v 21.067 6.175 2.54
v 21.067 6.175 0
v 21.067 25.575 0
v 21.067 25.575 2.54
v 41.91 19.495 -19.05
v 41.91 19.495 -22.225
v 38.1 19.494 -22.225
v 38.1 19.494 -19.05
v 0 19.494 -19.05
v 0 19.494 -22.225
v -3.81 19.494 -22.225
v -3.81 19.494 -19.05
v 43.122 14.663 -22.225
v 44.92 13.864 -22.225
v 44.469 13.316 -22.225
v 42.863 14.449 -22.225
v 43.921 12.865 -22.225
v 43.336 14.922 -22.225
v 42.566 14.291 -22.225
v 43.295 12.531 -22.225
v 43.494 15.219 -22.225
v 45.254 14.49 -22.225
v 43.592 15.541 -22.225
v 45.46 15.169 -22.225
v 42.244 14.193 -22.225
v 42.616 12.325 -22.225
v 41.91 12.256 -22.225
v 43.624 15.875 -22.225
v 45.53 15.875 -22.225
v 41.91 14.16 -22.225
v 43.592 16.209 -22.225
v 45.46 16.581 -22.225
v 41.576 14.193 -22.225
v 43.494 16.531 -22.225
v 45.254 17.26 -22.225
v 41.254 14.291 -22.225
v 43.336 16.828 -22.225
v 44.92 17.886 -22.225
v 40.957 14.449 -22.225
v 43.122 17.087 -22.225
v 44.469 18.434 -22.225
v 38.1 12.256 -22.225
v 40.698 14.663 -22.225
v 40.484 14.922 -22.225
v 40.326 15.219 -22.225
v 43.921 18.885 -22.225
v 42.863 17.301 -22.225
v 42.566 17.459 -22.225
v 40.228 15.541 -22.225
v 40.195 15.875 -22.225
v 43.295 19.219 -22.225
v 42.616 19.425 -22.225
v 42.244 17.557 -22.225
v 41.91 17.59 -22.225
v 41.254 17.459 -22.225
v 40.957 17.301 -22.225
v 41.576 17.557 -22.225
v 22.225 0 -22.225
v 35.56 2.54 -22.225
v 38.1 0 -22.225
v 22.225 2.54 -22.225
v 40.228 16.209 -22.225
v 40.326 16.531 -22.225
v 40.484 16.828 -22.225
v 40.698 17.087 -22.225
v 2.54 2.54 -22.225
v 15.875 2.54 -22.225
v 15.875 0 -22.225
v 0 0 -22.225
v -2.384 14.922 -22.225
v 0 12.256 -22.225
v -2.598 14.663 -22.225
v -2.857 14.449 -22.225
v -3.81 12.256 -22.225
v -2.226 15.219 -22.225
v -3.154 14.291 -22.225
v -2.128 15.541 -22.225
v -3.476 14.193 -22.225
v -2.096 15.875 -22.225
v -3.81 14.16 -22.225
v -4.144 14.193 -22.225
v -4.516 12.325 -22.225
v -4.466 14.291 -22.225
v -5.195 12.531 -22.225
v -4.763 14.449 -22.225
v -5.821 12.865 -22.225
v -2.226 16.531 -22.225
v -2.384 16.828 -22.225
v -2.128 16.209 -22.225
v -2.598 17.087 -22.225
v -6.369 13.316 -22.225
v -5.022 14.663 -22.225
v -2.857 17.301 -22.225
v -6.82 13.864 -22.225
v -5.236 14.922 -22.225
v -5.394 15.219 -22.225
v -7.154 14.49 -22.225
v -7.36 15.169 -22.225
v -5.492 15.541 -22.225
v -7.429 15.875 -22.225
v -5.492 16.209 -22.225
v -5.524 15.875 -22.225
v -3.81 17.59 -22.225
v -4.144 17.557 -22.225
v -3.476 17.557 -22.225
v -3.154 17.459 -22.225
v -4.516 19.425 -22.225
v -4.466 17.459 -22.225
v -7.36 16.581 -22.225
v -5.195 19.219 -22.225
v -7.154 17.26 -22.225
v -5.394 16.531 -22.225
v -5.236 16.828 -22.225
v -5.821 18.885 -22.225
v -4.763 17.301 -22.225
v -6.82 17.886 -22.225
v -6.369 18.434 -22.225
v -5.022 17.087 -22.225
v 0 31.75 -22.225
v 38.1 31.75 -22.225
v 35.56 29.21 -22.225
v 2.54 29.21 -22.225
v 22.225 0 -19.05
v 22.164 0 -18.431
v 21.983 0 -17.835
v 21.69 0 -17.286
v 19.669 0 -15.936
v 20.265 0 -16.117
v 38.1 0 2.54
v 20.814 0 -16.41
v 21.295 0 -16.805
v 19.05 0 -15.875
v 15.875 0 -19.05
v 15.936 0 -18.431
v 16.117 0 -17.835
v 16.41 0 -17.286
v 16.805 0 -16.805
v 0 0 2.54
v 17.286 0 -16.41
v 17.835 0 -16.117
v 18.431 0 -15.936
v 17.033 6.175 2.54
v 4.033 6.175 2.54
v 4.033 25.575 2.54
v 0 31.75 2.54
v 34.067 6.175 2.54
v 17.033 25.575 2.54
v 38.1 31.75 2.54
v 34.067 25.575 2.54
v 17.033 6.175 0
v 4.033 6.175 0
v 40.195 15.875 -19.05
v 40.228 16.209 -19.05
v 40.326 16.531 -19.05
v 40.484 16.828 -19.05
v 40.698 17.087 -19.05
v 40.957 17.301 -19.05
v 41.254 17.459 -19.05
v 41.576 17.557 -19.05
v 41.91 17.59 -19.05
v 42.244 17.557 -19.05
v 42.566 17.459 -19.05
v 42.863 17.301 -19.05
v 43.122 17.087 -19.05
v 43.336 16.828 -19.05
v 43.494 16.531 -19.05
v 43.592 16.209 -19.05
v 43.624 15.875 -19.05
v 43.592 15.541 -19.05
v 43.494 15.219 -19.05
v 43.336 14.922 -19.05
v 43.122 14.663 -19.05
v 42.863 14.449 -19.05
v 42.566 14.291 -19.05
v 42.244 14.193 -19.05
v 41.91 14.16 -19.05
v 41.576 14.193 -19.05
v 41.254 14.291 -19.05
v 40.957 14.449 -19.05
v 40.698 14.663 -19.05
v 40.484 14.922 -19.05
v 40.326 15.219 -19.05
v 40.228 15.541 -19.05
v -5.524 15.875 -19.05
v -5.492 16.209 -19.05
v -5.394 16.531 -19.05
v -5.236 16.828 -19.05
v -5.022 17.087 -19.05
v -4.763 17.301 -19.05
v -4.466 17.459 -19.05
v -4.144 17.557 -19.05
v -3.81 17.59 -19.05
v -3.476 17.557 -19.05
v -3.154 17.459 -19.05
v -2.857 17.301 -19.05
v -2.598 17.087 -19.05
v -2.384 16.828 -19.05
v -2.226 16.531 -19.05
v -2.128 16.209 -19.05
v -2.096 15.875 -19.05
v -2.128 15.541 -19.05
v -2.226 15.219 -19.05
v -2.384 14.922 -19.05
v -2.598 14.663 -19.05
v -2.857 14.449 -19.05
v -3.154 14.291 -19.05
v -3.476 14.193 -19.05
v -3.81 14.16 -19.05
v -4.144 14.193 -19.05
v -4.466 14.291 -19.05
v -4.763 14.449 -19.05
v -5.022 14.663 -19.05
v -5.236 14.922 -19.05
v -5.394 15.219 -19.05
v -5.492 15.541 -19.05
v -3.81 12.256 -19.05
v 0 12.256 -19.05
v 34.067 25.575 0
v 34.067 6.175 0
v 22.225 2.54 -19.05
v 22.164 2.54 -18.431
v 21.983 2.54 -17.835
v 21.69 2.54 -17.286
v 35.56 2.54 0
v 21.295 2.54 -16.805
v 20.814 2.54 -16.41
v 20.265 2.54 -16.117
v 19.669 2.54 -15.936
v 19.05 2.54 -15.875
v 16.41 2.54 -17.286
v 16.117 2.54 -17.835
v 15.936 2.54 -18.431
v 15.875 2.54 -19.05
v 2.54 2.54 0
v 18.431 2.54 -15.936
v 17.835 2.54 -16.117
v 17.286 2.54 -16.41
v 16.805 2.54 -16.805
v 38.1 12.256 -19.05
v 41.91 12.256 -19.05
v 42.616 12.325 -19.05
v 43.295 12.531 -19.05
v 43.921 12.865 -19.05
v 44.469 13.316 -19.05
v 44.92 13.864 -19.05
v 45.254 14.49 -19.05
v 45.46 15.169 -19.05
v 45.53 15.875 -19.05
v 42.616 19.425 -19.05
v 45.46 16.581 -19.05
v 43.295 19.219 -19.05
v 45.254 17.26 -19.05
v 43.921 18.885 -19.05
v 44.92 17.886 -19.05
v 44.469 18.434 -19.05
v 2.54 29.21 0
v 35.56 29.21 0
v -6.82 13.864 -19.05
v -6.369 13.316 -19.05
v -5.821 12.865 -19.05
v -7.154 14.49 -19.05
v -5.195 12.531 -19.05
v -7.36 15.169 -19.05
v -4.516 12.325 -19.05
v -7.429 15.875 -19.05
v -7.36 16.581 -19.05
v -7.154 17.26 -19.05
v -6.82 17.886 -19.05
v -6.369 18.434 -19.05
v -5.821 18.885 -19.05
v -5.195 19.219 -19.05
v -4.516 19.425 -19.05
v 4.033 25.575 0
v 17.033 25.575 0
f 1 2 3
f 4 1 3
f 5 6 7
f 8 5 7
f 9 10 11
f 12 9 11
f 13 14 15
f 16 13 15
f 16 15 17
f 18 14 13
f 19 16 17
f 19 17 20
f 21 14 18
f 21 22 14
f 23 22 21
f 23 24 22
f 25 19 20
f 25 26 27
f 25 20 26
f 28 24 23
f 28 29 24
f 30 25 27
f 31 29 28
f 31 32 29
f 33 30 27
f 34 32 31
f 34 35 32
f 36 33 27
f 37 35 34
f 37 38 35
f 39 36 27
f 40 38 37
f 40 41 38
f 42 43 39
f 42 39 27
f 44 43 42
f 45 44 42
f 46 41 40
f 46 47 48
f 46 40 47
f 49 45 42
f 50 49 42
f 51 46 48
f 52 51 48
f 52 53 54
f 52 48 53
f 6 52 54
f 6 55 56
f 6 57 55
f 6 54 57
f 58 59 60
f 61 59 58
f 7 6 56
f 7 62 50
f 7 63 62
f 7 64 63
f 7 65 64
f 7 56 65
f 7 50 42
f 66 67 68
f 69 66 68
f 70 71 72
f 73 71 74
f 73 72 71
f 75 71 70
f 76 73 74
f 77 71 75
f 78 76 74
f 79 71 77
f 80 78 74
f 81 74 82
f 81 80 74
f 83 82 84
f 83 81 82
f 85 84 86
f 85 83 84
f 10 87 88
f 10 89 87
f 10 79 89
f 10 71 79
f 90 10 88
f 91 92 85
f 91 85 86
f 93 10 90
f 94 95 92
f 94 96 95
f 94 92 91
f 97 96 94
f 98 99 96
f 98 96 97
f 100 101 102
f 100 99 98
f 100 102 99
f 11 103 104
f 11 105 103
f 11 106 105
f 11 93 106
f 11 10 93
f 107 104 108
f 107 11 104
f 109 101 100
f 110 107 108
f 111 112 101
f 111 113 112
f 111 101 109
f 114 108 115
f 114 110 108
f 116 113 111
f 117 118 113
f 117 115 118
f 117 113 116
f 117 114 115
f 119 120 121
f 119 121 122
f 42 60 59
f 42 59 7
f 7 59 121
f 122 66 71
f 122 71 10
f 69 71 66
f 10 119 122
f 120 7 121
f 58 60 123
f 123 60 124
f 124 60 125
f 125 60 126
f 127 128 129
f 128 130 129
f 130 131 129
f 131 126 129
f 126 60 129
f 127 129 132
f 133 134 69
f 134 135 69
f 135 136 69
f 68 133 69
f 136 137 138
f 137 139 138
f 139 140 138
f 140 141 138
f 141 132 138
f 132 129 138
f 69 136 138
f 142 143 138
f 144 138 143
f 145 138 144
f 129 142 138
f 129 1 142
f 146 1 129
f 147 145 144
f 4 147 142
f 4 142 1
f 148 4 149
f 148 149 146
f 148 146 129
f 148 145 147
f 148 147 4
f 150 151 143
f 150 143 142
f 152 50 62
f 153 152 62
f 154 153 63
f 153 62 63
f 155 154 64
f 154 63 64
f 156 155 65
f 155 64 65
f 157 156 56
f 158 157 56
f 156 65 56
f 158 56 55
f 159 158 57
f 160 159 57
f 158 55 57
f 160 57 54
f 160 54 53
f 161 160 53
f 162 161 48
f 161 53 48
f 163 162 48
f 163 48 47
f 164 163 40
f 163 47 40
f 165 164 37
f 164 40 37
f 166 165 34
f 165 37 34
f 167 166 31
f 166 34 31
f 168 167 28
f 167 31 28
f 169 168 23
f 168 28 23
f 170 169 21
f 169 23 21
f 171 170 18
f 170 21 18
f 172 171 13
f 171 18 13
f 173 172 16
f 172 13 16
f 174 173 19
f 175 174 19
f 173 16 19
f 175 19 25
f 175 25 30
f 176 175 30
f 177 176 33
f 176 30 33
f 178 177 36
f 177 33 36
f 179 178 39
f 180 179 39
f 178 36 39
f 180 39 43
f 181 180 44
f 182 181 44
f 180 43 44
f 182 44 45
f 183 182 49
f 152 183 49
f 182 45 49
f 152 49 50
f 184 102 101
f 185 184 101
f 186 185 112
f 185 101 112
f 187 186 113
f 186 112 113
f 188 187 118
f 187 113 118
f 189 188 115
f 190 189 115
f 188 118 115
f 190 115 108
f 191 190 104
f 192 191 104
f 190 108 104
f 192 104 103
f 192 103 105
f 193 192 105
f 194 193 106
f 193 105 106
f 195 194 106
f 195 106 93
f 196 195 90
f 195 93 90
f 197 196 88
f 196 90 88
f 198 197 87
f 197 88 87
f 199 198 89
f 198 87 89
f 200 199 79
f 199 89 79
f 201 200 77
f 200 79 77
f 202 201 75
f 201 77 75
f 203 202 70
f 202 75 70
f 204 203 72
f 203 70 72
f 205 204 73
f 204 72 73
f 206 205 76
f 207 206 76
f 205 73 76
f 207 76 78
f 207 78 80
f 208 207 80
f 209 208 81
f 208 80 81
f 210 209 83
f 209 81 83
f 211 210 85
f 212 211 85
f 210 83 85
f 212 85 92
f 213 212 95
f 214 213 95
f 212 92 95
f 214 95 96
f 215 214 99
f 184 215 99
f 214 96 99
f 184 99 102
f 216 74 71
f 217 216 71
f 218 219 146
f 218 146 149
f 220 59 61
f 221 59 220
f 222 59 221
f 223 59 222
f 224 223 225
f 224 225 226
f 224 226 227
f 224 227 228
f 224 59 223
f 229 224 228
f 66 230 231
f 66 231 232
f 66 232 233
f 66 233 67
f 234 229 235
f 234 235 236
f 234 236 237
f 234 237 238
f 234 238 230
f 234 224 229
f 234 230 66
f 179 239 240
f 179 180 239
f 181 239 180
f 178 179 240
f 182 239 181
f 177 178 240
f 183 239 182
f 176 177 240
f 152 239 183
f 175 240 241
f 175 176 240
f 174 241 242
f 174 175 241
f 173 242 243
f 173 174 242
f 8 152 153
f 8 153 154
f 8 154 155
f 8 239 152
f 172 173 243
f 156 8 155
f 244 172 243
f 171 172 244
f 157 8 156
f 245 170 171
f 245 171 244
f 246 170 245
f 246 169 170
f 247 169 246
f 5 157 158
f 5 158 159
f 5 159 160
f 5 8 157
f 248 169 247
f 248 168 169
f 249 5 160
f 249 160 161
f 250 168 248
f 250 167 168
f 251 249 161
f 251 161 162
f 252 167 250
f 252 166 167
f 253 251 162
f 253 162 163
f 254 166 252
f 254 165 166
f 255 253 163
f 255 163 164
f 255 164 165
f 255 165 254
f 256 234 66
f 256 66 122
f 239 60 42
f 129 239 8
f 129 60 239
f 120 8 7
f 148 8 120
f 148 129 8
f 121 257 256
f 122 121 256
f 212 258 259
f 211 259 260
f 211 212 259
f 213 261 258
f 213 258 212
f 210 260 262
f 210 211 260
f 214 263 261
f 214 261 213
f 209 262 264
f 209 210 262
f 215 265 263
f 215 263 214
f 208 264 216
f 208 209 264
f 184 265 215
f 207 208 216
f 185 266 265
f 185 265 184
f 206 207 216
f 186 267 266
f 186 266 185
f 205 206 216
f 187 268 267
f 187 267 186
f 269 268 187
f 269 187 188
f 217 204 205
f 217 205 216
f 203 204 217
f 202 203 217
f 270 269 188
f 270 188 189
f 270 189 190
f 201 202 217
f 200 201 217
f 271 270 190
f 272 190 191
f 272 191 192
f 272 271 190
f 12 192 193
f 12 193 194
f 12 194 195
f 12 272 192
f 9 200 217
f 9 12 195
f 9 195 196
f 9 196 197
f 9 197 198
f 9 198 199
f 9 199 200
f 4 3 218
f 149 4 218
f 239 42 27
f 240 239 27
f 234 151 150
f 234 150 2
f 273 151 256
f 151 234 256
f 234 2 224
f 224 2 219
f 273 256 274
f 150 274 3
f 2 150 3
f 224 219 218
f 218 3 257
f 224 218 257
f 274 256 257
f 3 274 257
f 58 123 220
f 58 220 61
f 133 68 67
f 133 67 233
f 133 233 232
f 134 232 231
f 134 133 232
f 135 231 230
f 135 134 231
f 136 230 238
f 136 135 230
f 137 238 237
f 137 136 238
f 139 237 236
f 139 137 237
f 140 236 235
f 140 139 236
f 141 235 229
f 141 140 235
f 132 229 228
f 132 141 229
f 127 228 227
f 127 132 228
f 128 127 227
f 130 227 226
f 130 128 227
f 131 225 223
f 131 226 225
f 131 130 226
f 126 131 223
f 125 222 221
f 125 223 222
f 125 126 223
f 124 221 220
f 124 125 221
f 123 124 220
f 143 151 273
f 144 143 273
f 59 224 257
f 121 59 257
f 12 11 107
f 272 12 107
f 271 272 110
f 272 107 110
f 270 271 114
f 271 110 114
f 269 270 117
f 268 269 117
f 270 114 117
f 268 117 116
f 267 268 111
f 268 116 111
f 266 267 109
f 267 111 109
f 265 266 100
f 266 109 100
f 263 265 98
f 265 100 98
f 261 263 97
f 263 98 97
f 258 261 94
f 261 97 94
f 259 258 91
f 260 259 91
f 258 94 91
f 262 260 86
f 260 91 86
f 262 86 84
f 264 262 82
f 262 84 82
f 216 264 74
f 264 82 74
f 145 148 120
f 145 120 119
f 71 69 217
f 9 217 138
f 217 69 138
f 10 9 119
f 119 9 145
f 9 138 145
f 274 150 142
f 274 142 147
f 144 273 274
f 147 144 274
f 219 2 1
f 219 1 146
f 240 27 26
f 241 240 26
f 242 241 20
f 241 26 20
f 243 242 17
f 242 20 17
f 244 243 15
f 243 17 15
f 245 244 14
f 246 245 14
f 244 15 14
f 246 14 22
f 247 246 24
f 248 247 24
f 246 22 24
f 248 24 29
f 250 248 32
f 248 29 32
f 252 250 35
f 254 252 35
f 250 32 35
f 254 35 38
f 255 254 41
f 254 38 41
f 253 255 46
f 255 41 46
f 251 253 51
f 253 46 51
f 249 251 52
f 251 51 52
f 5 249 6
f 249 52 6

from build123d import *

# Parameters (mm, degrees)
SKETCH1_W           = 38.1
SKETCH1_H           = 31.75
SKETCH1_W_2         = 13
SKETCH1_H_2         = 19.4
BOSS_EXTRUDE1_DEPTH = 2.54
SKETCH2_W           = 38.1
SKETCH2_H           = 31.75
SKETCH2_W_2         = 33.02
SKETCH2_H_2         = 26.67
BOSS_EXTRUDE2_DEPTH = 22.225
SKETCH3_R           = 1.7145
BOSS_EXTRUDE3_DEPTH = 3.175
CUT_EXTRUDE1_REACH  = 61.791


with BuildPart() as part:
    # Sketch1 → Boss-Extrude1 (new body)
    with BuildSketch(Plane.XY):
        with Locations((19.05, 15.875)):
            Rectangle(SKETCH1_W, SKETCH1_H)
        with Locations((10.533333333, 15.875)):
            Rectangle(SKETCH1_W_2, SKETCH1_H_2, mode=Mode.SUBTRACT)
        with Locations((27.566666667, 15.875)):
            Rectangle(SKETCH1_W_2, SKETCH1_H_2, mode=Mode.SUBTRACT)
    extrude(amount=BOSS_EXTRUDE1_DEPTH)

    # Sketch2 → Boss-Extrude2 (add)
    with BuildSketch(Plane(origin=(0, 0, 0), x_dir=(-1, 0, 0), z_dir=(0, 0, -1))):
        with Locations((-19.05, 15.875)):
            Rectangle(SKETCH2_W, SKETCH2_H)
        with Locations((-19.05, 15.875)):
            Rectangle(SKETCH2_W_2, SKETCH2_H_2, mode=Mode.SUBTRACT)
    extrude(amount=BOSS_EXTRUDE2_DEPTH)

    # Sketch3 → Boss-Extrude3 (add)
    # profile 1 of 2: a face of its own
    with BuildSketch(Plane(origin=(0, 0, -22.225), x_dir=(-1, 0, 0), z_dir=(0, 0, -1))):
        with BuildLine():
            Line((-41.91, 19.4945), (-38.1, 19.4945))
            Line((-38.1, 19.4945), (-38.1, 12.2555))
            Line((-38.1, 12.2555), (-41.91, 12.2555))
            ThreePointArc((-41.91, 12.2555), (-45.5295, 15.875), (-41.91, 19.4945))
        make_face()
        with Locations((-41.91, 15.875)):
            Circle(SKETCH3_R, mode=Mode.SUBTRACT)
    # profile 2 of 2: a face of its own
    with BuildSketch(Plane(origin=(0, 0, -22.225), x_dir=(-1, 0, 0), z_dir=(0, 0, -1))):
        with BuildLine():
            Line((3.81, 12.2555), (0, 12.2555))
            Line((0, 12.2555), (0, 19.4945))
            Line((0, 19.4945), (3.81, 19.4945))
            ThreePointArc((3.81, 19.4945), (7.4295, 15.875), (3.81, 12.2555))
        make_face()
        with Locations((3.81, 15.875)):
            Circle(SKETCH3_R, mode=Mode.SUBTRACT)
    extrude(amount=-BOSS_EXTRUDE3_DEPTH)

    # Sketch4 → Cut-Extrude1 (cut, up to next)
    with BuildSketch(Plane.XZ, mode=Mode.PRIVATE) as cut_extrude1_sk1:
        with BuildLine():
            Line((22.225, -19.05), (22.225, -22.225))
            Line((22.225, -22.225), (15.875, -22.225))
            Line((15.875, -22.225), (15.875, -19.05))
            ThreePointArc((15.875, -19.05), (19.05, -15.875), (22.225, -19.05))
        make_face()
    cut_extrude1_tool1 = extrude(cut_extrude1_sk1.sketch, amount=-CUT_EXTRUDE1_REACH, mode=Mode.PRIVATE) & part.part
    add(cut_extrude1_tool1.solids().sort_by_distance((19.05, 0, -19.346386))[0], mode=Mode.SUBTRACT)


solid = part.part
